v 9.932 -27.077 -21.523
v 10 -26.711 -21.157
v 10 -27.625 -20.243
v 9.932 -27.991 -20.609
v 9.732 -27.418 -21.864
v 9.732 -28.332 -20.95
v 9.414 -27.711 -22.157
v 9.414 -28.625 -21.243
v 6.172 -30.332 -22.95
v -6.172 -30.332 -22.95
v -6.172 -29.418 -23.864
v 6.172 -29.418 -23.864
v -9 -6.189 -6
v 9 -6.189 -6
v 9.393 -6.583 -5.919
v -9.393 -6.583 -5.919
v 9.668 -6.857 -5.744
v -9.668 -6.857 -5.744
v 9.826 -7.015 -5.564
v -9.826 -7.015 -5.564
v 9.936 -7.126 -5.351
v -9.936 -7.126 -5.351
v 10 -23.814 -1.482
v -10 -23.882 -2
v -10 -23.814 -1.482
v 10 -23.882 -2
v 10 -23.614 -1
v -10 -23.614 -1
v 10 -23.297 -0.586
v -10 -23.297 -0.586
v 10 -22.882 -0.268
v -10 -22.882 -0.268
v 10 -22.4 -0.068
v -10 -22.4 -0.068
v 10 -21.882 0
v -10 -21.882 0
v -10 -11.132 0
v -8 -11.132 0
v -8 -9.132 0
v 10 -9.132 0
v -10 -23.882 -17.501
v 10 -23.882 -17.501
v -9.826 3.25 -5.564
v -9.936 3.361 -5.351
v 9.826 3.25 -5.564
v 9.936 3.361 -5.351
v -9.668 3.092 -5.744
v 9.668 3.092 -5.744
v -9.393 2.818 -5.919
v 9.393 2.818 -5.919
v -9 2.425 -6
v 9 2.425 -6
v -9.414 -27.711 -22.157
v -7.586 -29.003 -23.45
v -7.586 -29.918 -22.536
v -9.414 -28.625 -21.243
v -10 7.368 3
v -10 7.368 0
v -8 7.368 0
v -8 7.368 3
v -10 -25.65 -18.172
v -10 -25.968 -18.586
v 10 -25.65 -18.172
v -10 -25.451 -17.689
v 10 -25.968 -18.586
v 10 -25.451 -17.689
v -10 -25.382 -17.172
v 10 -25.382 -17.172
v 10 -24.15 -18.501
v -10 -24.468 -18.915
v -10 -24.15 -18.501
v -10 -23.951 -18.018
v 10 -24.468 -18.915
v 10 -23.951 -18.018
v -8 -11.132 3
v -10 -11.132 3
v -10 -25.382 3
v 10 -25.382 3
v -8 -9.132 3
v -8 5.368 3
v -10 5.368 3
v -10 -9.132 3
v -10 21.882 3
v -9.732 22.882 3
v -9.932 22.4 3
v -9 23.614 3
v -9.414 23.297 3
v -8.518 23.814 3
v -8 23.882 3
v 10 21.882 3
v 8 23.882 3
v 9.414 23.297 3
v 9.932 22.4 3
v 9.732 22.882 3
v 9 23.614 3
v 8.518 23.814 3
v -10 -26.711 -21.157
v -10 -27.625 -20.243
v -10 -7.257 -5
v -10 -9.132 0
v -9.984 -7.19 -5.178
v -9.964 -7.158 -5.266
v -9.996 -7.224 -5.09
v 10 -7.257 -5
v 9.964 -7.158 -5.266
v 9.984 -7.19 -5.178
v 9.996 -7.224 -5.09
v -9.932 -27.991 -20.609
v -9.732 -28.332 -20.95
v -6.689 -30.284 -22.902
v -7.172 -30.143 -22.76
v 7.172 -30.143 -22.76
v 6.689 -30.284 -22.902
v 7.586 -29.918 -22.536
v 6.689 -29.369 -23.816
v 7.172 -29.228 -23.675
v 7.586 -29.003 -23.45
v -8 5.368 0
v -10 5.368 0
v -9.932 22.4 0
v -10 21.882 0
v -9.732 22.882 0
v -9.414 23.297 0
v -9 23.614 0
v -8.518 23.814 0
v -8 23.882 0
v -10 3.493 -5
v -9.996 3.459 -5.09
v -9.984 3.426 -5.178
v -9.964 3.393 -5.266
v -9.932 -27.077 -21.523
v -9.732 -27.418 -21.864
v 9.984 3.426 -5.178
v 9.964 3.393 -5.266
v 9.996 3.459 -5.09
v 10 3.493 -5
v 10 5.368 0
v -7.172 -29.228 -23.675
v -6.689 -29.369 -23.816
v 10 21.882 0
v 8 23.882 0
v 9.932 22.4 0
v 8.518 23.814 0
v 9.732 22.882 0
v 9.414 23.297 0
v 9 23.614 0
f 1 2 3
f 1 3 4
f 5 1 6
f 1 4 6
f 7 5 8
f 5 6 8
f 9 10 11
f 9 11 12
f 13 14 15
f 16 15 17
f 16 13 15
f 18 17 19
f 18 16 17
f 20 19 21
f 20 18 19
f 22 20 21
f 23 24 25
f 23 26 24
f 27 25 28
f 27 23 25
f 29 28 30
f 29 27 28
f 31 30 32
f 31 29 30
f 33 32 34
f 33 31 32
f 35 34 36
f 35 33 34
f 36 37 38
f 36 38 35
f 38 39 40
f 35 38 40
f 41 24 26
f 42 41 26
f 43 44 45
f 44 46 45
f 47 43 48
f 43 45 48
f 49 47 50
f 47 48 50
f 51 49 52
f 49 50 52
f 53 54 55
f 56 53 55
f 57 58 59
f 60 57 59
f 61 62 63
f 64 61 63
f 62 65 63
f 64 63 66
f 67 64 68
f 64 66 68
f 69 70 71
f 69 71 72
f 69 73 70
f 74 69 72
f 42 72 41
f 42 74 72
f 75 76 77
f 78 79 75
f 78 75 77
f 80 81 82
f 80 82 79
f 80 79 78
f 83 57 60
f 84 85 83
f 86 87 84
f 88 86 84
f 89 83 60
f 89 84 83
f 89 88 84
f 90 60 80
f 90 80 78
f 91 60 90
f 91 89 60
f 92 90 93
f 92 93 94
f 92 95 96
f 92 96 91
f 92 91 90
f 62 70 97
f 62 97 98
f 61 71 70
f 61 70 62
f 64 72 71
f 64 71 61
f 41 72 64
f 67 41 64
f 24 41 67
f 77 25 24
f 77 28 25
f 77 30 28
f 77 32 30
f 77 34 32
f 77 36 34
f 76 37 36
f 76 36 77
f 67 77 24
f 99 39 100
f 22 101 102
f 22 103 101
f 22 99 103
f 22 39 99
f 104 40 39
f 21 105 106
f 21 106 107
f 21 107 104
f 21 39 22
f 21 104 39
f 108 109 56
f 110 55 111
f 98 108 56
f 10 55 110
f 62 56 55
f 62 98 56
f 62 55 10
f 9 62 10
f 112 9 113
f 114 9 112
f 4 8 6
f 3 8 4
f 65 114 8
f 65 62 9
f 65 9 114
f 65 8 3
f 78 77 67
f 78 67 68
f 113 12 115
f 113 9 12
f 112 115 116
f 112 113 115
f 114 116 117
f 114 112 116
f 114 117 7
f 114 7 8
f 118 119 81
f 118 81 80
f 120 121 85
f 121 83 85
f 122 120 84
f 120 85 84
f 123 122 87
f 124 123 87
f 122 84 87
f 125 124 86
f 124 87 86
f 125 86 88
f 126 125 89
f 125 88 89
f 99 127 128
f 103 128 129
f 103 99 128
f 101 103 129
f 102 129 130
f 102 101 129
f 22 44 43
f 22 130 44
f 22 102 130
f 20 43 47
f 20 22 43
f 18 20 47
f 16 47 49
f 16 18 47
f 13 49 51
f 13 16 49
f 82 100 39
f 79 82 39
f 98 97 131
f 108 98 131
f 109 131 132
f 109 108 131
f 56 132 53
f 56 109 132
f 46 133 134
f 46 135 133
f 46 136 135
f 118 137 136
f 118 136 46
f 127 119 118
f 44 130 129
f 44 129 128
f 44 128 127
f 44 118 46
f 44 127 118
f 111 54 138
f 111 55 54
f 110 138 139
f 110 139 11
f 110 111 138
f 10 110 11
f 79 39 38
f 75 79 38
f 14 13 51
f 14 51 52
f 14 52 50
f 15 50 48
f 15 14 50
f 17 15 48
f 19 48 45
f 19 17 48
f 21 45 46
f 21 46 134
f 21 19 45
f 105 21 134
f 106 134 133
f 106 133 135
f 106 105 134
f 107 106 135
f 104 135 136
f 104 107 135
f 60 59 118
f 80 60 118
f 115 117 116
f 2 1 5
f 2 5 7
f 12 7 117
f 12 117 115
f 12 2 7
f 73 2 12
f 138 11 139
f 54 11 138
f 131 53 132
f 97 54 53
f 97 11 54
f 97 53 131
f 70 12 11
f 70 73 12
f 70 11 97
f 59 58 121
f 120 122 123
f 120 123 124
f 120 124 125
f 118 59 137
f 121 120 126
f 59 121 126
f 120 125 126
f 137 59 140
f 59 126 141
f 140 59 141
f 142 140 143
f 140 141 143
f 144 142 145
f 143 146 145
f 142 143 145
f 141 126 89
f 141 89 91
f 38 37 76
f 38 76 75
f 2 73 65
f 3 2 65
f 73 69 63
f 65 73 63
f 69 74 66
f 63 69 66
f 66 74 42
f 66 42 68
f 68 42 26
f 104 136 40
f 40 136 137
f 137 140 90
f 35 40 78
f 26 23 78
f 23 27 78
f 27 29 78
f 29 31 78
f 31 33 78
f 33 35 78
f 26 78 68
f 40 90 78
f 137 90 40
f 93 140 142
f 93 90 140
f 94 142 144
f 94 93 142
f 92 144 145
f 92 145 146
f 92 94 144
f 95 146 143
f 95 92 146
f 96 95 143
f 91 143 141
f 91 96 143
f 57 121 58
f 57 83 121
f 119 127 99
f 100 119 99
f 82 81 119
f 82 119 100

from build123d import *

# Parameters (mm, degrees)
F0_W         = 20
F0_H         = 47.7648153901
F1_DEPTH     = 3
F3_W         = 20
F3_H         = 23
F4_DEPTH     = 1.5
F5_T1_DEPTH  = 30.2867319519
F6_W         = 20
F6_H         = 2.1213203436
F7_DEPTH     = 7
F8_W         = 23.5785972327
F8_H         = 18.0557984859
F9_DEPTH     = 0.828
F10_SIZE     = 3
F11_R        = 2
F12_W        = 20
F12_H        = 16
F13_DEPTH    = 6
F14_T4_DEPTH = 61.5019292892
F14_T9_DEPTH = 61.5019292892
F15_R        = 2
F16_R        = 1
F17_W        = 2
F17_H        = 2
F18_DEPTH    = 3


# Not quite as in the source:
# - a fillet or chamfer that OpenCascade refuses, or shapes differently, is made with other operations: its cross-section is extruded or revolved along the edge and cut away or added


with BuildPart() as f1:
    # F0 (on Top) → F1 (new body)
    with BuildSketch(Plane.XY):
        Rectangle(F0_W, F0_H)
    extrude(amount=F1_DEPTH)

    # F3 (on offset) → F4 (join)
    with BuildSketch(Plane.XZ.offset(23.8824076951)):
        with Locations((0, -8.5)):
            Rectangle(F3_W, F3_H)
    extrude(amount=F4_DEPTH)

    # F5: chamfer of 2 on 1 edges, made by hand

    # F5_s2 → F5_t1 (cut)
    with BuildSketch(Plane.YZ.offset(-15.1433659759)):
        Polygon((-25.3824076951, -18), (-23.3824076951, -20), (-25.3824076951, -20), align=None)
    extrude(amount=F5_T1_DEPTH, mode=Mode.SUBTRACT)

    # F6 (on face) → F7 (join)
    with BuildSketch(Plane(origin=(0, -21.6912038475, -21.6912038475), x_dir=(1, 0, 0), z_dir=(0, -0.7071067812, -0.7071067812))):
        with Locations((0, 4.1594903709)):
            Rectangle(F6_W, F6_H)
    extrude(amount=F7_DEPTH)

    # F8 (on face) → F9 (cut)
    with BuildSketch(Plane(origin=(0, -2.1912038475, 2.1912038475), x_dir=(-1, 0, 0), z_dir=(0, 0.7071067812, -0.7071067812))):
        with Locations((-0.010414049, -33.0743109807)):
            Rectangle(F8_W, F8_H)
    extrude(amount=-F9_DEPTH, mode=Mode.SUBTRACT)

    # F10
    f10_edges = [f1.edges().sort_by_distance(p)[0] for p in [
        (-10, -29.874897, -23.407005),
        (10, -29.874897, -23.407005),
    ]]
    chamfer(f10_edges, length=F10_SIZE)

    # F11
    f11_edges = [f1.edges().sort_by_distance(p)[0] for p in [
        (0, -23.882408, 0),
        (0, -25.382408, -18),
        (0, -23.882408, -18.329031),
        (-10, -27.753577, -21.285685),
        (-7, -29.874897, -23.407005),
        (7, -29.874897, -23.407005),
        (10, -27.753577, -21.285685),
    ]]
    fillet(f11_edges, radius=F11_R)

    # F12 (on face) → F13 (join)
    with BuildSketch(Plane(origin=(0, 0, 0), x_dir=(1, 0, 0), z_dir=(0, 0, -1))):
        with Locations((0, 1.8824076951)):
            Rectangle(F12_W, F12_H)
    extrude(amount=F13_DEPTH)

    # F14: chamfer of 3 x 8 on 2 edges, made by hand


with BuildPart() as f14_tool2:
    # F14_s3 → F14_t4 (new body)
    with BuildSketch(Plane.YZ.offset(30.7509646446)):
        Polygon((-9.8824076951, 2), (-6.8824076951, -6), (-9.8824076951, -6), align=None)
    extrude(amount=-F14_T4_DEPTH)

    split(bisect_by=Plane.XY, keep=Keep.BOTTOM)


with BuildPart() as f1_1:
    add(f1.part)

    # F14_t1: cut F14_tool2
    add(f14_tool2.part, mode=Mode.SUBTRACT)


with BuildPart() as f14_tool7:
    # F14_s8 → F14_t9 (new body)
    with BuildSketch(Plane.YZ.offset(-30.7509646446)):
        Polygon((6.1175923049, 2), (3.1175923049, -6), (6.1175923049, -6), align=None)
    extrude(amount=F14_T9_DEPTH)

    split(bisect_by=Plane.XY, keep=Keep.BOTTOM)


with BuildPart() as f1_2:
    add(f1_1.part)

    # F14_t6: cut F14_tool7
    add(f14_tool7.part, mode=Mode.SUBTRACT)

    # F15
    f15_edges = [f1_2.edges().sort_by_distance(p)[0] for p in [
        (-10, 23.882408, 1.5),
        (10, 23.882408, 1.5),
    ]]
    fillet(f15_edges, radius=F15_R)

    # F16
    f16_edges = [f1_2.edges().sort_by_distance(p)[0] for p in [
        (-10, -1.882408, -6),
        (0, -6.882408, -6),
        (10, -1.882408, -6),
        (0, 3.117592, -6),
    ]]
    fillet(f16_edges, radius=F16_R)

    # F17 (on face) → F18 (cut, through all)
    with BuildSketch(Plane(origin=(0, 0, 0), x_dir=(1, 0, 0), z_dir=(0, 0, -1))):
        with Locations((-9, -6.3675923049)):
            Rectangle(F17_W, F17_H)
        with Locations((-9, 10.1324076951)):
            Rectangle(F17_W, F17_H)
    extrude(amount=-F18_DEPTH, mode=Mode.SUBTRACT)


solid = f1_2.part
